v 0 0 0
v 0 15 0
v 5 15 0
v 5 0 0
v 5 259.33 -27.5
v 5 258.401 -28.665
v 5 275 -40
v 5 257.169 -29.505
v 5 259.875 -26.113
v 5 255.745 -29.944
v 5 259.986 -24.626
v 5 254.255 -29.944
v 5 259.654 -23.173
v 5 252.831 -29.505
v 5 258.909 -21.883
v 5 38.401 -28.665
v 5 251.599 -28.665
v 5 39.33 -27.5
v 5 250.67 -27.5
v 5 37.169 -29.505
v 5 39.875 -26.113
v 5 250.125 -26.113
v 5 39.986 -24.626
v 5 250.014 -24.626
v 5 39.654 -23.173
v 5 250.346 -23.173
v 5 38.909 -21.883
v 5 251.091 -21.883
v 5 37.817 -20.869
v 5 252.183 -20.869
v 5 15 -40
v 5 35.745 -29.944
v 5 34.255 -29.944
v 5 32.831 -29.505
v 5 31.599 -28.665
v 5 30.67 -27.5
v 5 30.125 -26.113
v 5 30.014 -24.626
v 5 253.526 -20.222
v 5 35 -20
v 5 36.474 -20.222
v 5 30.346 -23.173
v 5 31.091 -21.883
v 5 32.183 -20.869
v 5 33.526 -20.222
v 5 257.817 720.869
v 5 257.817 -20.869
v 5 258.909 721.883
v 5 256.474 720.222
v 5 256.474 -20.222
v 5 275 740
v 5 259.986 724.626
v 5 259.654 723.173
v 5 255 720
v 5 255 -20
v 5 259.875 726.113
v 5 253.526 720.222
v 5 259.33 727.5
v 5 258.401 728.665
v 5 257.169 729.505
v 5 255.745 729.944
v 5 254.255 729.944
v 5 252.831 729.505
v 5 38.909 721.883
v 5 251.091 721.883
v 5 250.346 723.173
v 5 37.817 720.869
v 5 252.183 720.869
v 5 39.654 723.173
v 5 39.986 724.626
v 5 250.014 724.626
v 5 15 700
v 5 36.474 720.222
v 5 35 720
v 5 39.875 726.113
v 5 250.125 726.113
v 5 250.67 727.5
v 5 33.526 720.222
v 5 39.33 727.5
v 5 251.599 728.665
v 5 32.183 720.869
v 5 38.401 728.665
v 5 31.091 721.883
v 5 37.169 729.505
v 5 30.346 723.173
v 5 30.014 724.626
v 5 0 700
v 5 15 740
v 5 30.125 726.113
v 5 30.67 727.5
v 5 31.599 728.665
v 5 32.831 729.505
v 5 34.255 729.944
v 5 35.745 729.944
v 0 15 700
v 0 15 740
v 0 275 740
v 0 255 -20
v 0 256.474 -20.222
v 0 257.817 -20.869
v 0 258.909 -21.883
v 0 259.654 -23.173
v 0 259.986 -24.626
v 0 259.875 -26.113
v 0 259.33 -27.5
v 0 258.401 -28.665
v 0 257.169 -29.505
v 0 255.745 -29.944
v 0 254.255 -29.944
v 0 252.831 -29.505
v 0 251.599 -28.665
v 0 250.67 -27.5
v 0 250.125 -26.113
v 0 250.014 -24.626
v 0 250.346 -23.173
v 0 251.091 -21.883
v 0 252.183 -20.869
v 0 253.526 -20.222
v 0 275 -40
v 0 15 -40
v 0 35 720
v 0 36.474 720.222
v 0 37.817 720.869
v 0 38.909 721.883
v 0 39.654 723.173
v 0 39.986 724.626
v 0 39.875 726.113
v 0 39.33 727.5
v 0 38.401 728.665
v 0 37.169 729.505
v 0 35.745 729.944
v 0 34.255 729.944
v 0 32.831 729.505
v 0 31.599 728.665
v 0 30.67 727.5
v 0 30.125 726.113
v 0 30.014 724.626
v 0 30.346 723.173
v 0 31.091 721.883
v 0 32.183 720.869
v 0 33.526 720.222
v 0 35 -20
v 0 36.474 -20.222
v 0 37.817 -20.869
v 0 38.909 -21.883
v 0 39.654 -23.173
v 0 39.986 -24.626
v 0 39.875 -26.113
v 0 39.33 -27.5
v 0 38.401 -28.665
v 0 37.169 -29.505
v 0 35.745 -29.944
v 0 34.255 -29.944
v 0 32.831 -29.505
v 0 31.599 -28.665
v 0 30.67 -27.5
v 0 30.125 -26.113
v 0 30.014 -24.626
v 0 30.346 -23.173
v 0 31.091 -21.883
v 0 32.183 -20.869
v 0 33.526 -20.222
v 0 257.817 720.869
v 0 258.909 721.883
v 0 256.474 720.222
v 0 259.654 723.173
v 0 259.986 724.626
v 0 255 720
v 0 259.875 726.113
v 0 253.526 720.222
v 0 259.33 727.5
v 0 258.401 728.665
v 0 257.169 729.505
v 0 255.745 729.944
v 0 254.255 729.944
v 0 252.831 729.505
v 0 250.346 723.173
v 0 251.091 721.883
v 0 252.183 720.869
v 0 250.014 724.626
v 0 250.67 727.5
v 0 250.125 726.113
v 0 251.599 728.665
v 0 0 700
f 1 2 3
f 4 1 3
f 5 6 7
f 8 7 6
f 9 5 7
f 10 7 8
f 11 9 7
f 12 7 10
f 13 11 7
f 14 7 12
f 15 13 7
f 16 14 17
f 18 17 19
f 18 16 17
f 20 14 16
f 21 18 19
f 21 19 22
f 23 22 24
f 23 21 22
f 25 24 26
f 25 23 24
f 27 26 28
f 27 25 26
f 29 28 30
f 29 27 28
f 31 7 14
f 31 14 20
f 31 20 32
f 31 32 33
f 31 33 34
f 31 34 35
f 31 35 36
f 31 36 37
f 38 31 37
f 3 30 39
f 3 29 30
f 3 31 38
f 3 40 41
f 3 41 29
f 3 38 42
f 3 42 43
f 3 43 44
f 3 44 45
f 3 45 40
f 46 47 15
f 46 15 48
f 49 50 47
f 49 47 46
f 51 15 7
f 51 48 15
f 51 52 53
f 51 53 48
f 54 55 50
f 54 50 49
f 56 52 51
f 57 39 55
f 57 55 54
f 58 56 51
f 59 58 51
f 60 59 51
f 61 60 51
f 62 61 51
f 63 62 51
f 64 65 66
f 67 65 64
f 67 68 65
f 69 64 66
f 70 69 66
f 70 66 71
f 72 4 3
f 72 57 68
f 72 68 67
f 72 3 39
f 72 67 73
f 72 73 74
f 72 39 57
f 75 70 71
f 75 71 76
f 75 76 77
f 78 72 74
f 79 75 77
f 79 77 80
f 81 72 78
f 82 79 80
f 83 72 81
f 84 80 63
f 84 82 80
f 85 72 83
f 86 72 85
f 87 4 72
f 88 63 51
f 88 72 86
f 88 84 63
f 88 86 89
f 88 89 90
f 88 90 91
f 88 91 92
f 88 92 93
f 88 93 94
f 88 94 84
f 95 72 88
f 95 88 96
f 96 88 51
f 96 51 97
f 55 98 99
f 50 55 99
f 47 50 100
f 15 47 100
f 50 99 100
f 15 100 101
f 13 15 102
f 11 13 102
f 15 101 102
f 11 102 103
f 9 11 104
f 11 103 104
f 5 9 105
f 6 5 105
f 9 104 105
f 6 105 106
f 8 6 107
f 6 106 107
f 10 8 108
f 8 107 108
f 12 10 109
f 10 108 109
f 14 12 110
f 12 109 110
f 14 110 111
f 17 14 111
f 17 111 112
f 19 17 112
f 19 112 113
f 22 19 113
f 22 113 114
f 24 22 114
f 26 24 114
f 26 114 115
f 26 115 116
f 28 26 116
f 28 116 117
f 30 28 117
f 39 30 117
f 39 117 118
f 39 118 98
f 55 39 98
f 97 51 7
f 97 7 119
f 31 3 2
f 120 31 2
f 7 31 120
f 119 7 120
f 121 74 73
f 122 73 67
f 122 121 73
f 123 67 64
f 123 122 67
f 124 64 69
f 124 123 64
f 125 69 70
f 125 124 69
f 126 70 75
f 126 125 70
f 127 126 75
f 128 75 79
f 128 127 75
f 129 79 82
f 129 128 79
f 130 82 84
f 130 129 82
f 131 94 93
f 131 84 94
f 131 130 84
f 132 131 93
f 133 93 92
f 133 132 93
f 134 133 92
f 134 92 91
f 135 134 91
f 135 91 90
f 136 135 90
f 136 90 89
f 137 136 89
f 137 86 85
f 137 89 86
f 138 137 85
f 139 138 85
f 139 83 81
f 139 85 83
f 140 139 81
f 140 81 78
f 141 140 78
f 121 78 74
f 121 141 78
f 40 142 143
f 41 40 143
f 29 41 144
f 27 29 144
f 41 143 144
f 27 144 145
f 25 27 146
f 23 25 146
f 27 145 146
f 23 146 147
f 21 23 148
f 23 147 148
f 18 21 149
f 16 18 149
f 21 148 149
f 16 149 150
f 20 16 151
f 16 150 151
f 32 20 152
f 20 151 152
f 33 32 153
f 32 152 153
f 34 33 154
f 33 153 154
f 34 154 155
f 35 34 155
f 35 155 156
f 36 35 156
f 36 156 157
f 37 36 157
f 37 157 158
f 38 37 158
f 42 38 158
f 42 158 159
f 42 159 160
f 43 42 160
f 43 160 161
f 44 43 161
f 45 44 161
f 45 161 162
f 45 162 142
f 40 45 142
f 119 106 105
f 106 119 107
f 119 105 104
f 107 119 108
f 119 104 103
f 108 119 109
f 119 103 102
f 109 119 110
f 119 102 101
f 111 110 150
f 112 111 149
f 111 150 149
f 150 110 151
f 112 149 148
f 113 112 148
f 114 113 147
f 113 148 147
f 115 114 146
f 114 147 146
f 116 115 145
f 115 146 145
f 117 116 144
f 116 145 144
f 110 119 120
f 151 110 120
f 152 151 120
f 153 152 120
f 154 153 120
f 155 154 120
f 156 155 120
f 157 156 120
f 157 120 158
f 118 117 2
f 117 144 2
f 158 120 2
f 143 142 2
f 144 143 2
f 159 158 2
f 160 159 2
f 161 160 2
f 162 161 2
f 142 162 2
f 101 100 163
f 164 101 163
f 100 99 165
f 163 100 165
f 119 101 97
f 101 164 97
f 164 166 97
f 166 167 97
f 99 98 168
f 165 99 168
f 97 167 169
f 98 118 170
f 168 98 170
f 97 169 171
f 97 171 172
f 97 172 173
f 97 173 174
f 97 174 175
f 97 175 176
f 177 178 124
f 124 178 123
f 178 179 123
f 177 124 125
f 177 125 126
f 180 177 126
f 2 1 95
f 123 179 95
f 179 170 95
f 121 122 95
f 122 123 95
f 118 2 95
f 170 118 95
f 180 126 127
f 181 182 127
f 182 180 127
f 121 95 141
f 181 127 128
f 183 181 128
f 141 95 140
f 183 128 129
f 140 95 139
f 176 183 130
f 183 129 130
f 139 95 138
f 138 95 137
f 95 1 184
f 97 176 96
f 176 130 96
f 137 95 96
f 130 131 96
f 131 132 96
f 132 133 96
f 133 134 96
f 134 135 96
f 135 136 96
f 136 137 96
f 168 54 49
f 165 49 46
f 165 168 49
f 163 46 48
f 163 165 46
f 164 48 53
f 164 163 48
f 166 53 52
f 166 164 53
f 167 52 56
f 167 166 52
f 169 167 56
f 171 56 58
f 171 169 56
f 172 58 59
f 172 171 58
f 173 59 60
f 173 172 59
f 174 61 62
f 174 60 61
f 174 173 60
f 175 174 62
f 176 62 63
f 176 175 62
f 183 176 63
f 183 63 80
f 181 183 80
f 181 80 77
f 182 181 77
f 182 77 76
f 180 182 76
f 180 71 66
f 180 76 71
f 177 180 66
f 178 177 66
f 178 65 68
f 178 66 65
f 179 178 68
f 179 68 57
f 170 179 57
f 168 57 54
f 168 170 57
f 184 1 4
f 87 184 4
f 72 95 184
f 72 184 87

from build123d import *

# Parameters (mm, degrees)
SKETCH1_W           = 5
SKETCH1_H           = 275
BOSS_EXTRUDE1_DEPTH = 700
SKETCH2_W           = 5
SKETCH2_H           = 40
BOSS_EXTRUDE2_DEPTH = 260
SKETCH3_R           = 5
CUT_EXTRUDE1_DEPTH  = 790.461842016


with BuildPart() as part:
    # Sketch1 → Boss-Extrude1 (new body)
    with BuildSketch(Plane.XY):
        with Locations((2.5, 137.5)):
            Rectangle(SKETCH1_W, SKETCH1_H)
    extrude(amount=BOSS_EXTRUDE1_DEPTH)

    # Sketch2 → Boss-Extrude2 (add)
    with BuildSketch(Plane(origin=(0, 15, 0), x_dir=(-1, 0, 0), z_dir=(0, -1, 0))):
        with Locations((-2.5, 20)):
            Rectangle(SKETCH2_W, SKETCH2_H)
    boss_extrude2 = extrude(amount=-BOSS_EXTRUDE2_DEPTH)

    # Mirror1: Boss-Extrude2 across plane
    add(boss_extrude2.mirror(Plane(origin=(0, 0, 350), x_dir=(1, 0, 0), z_dir=(0, 0, -1))))

    # Sketch3 → Cut-Extrude1 (cut, through all)
    with BuildSketch(Plane.ZY):
        with Locations((-25, 255)):
            Circle(SKETCH3_R)
        with Locations((-25, 35)):
            Circle(SKETCH3_R)
    cut_extrude1 = extrude(amount=-CUT_EXTRUDE1_DEPTH, mode=Mode.SUBTRACT)

    # Mirror2: Cut-Extrude1 across plane
    add(cut_extrude1.mirror(Plane(origin=(0, 0, 350), x_dir=(1, 0, 0), z_dir=(0, 0, -1))), mode=Mode.SUBTRACT)


solid = part.part
